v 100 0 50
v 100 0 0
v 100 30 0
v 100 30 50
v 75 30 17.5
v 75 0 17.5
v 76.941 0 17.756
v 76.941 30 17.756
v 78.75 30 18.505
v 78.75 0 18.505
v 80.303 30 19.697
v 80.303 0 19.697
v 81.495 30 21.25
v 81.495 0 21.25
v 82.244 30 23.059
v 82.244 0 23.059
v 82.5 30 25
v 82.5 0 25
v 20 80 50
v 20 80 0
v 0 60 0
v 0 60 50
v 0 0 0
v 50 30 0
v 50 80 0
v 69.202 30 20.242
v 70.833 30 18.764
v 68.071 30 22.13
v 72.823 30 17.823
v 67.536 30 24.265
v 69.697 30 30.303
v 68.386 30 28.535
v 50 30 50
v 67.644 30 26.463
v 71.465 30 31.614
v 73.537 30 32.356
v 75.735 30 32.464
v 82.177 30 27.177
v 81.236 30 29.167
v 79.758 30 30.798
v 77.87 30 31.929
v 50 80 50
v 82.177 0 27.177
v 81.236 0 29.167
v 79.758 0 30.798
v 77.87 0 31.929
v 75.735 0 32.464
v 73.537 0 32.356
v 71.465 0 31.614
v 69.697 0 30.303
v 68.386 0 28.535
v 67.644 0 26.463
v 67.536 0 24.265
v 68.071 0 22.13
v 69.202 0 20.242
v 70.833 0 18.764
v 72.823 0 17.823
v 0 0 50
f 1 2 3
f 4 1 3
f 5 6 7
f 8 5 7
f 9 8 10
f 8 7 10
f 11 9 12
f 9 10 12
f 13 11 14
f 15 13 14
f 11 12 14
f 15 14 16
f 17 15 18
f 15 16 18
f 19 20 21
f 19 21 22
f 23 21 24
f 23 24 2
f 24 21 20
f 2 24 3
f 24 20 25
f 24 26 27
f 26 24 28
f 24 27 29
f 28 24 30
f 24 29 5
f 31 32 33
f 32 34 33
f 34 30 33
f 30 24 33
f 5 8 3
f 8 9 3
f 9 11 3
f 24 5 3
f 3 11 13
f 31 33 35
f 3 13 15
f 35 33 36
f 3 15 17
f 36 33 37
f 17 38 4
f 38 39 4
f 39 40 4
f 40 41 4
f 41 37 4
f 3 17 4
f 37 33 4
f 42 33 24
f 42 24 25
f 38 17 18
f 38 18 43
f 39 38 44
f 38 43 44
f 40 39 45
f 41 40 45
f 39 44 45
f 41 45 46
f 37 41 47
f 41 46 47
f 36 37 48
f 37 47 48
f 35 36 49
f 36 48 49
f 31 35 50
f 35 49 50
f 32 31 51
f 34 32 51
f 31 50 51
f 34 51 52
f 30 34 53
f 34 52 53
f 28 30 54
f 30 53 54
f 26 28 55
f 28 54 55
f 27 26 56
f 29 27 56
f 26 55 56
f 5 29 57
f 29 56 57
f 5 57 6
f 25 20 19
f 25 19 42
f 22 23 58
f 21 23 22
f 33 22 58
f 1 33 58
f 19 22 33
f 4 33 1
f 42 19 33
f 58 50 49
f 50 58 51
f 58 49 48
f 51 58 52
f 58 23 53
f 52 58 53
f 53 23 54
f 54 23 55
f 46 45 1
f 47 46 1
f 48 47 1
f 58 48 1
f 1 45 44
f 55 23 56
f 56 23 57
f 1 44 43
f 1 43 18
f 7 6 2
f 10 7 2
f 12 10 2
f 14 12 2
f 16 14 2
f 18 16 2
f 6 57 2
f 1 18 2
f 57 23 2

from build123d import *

# Parameters (mm, degrees)
F0_W     = 100
F0_H     = 80
F1_DEPTH = 50
F2_W     = 50
F2_H     = 50
F3_DEPTH = 50
F4_SIZE  = 20
F7_DEPTH = 80.001


with BuildPart() as f1:
    # F0 (on Top) → F1 (new body)
    with BuildSketch(Plane.XY):
        with Locations((50, 40)):
            Rectangle(F0_W, F0_H)
    extrude(amount=F1_DEPTH)

    # F2 (on face) → F3 (cut, through all)
    with BuildSketch(Plane.XY.offset(50)):
        with Locations((75, 55)):
            Rectangle(F2_W, F2_H)
    extrude(amount=-F3_DEPTH, mode=Mode.SUBTRACT)

    # F4
    f4_edges = [f1.edges().sort_by_distance(p)[0] for p in [
        (0, 80, 25),
    ]]
    chamfer(f4_edges, length=F4_SIZE)

    # F6 (on face) → F7 (cut, through all)
    with BuildSketch(Plane.XZ):
        with BuildLine():
            ThreePointArc((82.5, 25), (69.696699, 30.303301), (75, 17.5))
            ThreePointArc((75, 17.5), (80.303301, 19.696699), (82.5, 25))
        make_face()
    extrude(amount=-F7_DEPTH, mode=Mode.SUBTRACT)


solid = f1.part
